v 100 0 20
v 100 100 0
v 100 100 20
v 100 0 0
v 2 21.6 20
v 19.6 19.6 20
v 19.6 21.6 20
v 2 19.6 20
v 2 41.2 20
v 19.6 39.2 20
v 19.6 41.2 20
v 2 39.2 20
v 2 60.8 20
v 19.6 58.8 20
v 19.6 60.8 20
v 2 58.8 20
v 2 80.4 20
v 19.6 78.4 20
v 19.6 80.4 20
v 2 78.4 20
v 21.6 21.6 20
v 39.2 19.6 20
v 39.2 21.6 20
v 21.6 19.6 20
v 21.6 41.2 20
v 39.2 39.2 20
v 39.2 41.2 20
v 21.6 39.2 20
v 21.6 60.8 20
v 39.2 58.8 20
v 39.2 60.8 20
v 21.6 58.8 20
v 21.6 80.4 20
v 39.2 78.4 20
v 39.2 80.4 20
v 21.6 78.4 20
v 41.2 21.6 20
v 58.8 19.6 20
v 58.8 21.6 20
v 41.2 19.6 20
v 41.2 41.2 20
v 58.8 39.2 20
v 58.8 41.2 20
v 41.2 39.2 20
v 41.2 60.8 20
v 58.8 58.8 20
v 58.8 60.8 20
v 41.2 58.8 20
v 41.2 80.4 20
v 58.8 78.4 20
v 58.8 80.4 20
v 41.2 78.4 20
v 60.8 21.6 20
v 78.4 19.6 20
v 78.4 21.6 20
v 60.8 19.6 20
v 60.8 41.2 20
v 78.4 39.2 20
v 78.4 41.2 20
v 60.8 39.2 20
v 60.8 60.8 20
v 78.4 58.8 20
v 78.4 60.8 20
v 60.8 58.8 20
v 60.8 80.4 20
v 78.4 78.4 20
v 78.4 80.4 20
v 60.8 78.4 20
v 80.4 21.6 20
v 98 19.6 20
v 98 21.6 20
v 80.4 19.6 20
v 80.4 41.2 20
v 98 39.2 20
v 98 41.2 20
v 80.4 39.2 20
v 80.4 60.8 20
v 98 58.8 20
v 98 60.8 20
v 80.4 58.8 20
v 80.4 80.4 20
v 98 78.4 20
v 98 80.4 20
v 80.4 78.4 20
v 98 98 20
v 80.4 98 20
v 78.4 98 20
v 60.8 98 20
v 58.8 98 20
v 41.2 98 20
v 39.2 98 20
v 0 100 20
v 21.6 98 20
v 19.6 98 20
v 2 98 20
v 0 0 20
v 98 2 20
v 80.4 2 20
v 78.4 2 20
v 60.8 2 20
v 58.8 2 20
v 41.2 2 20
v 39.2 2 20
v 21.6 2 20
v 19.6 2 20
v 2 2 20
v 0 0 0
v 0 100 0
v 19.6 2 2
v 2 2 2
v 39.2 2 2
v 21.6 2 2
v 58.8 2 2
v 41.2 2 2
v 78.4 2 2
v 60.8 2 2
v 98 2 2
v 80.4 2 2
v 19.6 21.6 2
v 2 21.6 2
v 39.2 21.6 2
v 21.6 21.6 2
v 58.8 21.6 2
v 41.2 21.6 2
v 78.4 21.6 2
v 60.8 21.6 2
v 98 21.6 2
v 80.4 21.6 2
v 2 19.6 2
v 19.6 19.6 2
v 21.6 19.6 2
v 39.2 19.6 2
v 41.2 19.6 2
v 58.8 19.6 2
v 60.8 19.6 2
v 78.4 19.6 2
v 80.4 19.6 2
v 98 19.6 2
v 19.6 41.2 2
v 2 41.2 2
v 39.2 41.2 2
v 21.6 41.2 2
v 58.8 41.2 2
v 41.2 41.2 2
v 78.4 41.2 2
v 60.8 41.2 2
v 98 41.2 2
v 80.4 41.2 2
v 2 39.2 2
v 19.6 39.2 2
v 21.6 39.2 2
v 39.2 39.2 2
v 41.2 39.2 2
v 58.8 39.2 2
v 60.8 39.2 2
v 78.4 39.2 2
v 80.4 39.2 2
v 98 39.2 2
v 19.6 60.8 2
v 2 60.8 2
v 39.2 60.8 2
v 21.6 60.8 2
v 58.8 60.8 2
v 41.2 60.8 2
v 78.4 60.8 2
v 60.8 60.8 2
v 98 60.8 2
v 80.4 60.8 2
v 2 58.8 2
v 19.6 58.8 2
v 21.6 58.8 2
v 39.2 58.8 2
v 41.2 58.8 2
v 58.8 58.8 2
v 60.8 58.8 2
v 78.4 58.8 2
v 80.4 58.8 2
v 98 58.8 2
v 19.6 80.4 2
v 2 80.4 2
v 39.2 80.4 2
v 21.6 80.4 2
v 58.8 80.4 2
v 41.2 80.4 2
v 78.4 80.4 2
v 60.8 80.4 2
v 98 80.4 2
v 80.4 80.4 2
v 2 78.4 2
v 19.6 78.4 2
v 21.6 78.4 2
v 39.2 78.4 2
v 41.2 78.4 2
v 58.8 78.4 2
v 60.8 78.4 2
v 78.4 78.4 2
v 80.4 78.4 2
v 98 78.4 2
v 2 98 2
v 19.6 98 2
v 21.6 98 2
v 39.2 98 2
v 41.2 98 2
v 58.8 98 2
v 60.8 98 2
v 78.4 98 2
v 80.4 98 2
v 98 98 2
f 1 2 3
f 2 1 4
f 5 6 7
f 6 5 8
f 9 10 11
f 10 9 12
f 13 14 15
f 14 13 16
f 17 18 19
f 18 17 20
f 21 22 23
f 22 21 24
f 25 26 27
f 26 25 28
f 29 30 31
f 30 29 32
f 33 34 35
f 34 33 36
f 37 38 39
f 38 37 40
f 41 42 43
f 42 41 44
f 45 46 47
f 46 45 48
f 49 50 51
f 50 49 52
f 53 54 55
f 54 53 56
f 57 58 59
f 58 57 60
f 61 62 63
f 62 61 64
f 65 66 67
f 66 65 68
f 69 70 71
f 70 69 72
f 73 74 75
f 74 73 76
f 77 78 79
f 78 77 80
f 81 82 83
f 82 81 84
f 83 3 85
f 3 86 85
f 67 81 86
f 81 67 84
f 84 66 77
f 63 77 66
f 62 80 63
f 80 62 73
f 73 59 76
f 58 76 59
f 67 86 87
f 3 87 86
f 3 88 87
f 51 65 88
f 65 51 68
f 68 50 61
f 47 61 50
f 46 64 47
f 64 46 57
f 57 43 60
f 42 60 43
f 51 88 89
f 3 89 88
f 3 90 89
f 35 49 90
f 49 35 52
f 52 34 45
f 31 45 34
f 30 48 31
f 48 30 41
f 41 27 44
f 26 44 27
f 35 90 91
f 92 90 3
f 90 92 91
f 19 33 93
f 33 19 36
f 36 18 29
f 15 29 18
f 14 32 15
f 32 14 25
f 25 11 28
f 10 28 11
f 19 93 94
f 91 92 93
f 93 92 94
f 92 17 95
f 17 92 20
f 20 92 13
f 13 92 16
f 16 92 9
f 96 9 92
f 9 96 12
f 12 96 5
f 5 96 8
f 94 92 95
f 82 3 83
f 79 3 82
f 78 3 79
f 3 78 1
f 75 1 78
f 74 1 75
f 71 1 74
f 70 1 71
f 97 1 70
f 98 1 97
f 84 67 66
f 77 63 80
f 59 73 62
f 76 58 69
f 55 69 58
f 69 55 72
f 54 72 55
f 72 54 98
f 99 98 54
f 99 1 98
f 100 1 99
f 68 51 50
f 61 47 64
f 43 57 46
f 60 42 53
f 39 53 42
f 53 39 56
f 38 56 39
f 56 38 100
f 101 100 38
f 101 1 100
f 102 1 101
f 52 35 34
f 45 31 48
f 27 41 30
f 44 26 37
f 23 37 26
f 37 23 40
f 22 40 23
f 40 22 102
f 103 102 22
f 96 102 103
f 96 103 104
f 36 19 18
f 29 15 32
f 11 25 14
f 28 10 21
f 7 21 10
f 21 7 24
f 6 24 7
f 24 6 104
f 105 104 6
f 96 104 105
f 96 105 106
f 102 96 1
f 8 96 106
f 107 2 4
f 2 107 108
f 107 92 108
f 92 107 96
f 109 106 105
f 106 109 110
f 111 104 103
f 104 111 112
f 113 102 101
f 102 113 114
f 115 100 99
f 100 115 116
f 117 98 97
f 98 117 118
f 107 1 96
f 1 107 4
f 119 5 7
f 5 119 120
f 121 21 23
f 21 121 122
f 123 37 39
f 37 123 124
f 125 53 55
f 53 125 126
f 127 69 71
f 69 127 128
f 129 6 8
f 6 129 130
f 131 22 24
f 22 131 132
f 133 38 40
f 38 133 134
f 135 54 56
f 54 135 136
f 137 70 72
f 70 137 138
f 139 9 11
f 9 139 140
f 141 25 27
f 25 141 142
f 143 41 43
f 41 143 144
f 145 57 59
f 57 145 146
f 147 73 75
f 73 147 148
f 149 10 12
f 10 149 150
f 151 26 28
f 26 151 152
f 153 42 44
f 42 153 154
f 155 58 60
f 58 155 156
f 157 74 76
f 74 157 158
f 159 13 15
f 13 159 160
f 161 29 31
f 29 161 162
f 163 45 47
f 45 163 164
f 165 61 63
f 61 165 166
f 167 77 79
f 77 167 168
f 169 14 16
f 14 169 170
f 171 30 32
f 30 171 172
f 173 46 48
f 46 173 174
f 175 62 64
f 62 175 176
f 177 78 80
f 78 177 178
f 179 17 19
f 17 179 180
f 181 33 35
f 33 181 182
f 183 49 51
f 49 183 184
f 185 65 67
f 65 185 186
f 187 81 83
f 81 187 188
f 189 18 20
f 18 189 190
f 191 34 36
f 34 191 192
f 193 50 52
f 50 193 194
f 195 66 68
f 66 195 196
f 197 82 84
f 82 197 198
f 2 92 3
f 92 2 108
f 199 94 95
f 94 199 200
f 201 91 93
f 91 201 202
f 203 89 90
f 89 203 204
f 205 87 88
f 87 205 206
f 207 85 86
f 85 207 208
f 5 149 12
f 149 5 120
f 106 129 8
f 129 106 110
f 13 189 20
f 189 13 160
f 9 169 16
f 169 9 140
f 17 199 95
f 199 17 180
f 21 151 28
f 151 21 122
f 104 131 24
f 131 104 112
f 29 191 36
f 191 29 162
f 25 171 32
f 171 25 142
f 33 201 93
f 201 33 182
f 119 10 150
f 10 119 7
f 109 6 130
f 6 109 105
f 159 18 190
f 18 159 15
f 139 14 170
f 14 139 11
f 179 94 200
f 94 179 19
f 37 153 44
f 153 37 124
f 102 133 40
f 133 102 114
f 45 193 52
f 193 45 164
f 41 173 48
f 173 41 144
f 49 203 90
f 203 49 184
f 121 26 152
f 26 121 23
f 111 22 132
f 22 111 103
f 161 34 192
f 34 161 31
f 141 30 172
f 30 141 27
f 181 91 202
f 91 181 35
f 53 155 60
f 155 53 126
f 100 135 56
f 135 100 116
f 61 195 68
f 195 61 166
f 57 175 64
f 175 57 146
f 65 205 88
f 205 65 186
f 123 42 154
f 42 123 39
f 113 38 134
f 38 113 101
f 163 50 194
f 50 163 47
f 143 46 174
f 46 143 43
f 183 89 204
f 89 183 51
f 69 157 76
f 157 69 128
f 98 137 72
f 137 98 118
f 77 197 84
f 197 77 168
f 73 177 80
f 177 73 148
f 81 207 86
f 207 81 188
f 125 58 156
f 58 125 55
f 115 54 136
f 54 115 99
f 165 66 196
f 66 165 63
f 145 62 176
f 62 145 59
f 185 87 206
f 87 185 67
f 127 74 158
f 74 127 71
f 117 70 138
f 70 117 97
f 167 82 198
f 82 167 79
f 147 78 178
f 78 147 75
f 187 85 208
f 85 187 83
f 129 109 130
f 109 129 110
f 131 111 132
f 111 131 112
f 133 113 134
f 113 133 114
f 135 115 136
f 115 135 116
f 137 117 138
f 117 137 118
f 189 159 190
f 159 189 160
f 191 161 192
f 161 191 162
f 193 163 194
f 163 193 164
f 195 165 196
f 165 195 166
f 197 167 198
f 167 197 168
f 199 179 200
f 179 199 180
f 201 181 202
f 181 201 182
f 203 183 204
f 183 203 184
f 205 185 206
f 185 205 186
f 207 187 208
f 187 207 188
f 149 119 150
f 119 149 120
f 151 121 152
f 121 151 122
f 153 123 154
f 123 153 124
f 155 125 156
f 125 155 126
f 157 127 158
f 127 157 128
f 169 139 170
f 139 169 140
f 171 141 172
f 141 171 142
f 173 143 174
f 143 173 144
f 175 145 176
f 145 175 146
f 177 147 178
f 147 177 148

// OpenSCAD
/**
 * For generating rows x cols racks. The back of the rack
 * is along the XY plane and the partitions open along +X axis.
 * 
 * How to use
 * ==========
 * 
 * MAC
 * ---
 * 
 * open -n /Applications/OpenSCAD.app --args -o ~/Documents/work/ShopAssist/Models/rack10x10.stl -D 'rows=10' -D 'cols=10'  -D 'l=100' -D 'h=100' -D 'd=20' -D 't=2' ~/Documents/work/ShopAssist/Model\ Scripts/rack.scad
 * 
 * -D can be used to override any params in this file and hence we can generate racks of any dimension using this
 * same file.
 * -o is used to provide a target file name.
 *
 * @author: Saurabh Saxena
 */

l=100; // Outer Length
h=100; // Outer Height
d=20; // Outer Depth
t=2; // Material thickness
rows=5;
cols=5;

module plank(length, width, thickness) {
	cube([length, width, thickness]);
}

module xy_plank() {
	plank(l, h, t);
}

module yz_plank() {
	plank(t, h, d);
}

module xz_plank() {
	plank(l, t, d);
}

// Back
xy_plank();

// Horizontal planks
for (y_offset = [0 : (h-t)/rows : h-t]) {
	translate([0, y_offset, 0]) {
		xz_plank();
	}
}

// Vertical planks
for (x_offset = [0 : (l-t)/cols : (l-t)]) {
	translate([x_offset, 0, 0]) {
		yz_plank();
	}
}
